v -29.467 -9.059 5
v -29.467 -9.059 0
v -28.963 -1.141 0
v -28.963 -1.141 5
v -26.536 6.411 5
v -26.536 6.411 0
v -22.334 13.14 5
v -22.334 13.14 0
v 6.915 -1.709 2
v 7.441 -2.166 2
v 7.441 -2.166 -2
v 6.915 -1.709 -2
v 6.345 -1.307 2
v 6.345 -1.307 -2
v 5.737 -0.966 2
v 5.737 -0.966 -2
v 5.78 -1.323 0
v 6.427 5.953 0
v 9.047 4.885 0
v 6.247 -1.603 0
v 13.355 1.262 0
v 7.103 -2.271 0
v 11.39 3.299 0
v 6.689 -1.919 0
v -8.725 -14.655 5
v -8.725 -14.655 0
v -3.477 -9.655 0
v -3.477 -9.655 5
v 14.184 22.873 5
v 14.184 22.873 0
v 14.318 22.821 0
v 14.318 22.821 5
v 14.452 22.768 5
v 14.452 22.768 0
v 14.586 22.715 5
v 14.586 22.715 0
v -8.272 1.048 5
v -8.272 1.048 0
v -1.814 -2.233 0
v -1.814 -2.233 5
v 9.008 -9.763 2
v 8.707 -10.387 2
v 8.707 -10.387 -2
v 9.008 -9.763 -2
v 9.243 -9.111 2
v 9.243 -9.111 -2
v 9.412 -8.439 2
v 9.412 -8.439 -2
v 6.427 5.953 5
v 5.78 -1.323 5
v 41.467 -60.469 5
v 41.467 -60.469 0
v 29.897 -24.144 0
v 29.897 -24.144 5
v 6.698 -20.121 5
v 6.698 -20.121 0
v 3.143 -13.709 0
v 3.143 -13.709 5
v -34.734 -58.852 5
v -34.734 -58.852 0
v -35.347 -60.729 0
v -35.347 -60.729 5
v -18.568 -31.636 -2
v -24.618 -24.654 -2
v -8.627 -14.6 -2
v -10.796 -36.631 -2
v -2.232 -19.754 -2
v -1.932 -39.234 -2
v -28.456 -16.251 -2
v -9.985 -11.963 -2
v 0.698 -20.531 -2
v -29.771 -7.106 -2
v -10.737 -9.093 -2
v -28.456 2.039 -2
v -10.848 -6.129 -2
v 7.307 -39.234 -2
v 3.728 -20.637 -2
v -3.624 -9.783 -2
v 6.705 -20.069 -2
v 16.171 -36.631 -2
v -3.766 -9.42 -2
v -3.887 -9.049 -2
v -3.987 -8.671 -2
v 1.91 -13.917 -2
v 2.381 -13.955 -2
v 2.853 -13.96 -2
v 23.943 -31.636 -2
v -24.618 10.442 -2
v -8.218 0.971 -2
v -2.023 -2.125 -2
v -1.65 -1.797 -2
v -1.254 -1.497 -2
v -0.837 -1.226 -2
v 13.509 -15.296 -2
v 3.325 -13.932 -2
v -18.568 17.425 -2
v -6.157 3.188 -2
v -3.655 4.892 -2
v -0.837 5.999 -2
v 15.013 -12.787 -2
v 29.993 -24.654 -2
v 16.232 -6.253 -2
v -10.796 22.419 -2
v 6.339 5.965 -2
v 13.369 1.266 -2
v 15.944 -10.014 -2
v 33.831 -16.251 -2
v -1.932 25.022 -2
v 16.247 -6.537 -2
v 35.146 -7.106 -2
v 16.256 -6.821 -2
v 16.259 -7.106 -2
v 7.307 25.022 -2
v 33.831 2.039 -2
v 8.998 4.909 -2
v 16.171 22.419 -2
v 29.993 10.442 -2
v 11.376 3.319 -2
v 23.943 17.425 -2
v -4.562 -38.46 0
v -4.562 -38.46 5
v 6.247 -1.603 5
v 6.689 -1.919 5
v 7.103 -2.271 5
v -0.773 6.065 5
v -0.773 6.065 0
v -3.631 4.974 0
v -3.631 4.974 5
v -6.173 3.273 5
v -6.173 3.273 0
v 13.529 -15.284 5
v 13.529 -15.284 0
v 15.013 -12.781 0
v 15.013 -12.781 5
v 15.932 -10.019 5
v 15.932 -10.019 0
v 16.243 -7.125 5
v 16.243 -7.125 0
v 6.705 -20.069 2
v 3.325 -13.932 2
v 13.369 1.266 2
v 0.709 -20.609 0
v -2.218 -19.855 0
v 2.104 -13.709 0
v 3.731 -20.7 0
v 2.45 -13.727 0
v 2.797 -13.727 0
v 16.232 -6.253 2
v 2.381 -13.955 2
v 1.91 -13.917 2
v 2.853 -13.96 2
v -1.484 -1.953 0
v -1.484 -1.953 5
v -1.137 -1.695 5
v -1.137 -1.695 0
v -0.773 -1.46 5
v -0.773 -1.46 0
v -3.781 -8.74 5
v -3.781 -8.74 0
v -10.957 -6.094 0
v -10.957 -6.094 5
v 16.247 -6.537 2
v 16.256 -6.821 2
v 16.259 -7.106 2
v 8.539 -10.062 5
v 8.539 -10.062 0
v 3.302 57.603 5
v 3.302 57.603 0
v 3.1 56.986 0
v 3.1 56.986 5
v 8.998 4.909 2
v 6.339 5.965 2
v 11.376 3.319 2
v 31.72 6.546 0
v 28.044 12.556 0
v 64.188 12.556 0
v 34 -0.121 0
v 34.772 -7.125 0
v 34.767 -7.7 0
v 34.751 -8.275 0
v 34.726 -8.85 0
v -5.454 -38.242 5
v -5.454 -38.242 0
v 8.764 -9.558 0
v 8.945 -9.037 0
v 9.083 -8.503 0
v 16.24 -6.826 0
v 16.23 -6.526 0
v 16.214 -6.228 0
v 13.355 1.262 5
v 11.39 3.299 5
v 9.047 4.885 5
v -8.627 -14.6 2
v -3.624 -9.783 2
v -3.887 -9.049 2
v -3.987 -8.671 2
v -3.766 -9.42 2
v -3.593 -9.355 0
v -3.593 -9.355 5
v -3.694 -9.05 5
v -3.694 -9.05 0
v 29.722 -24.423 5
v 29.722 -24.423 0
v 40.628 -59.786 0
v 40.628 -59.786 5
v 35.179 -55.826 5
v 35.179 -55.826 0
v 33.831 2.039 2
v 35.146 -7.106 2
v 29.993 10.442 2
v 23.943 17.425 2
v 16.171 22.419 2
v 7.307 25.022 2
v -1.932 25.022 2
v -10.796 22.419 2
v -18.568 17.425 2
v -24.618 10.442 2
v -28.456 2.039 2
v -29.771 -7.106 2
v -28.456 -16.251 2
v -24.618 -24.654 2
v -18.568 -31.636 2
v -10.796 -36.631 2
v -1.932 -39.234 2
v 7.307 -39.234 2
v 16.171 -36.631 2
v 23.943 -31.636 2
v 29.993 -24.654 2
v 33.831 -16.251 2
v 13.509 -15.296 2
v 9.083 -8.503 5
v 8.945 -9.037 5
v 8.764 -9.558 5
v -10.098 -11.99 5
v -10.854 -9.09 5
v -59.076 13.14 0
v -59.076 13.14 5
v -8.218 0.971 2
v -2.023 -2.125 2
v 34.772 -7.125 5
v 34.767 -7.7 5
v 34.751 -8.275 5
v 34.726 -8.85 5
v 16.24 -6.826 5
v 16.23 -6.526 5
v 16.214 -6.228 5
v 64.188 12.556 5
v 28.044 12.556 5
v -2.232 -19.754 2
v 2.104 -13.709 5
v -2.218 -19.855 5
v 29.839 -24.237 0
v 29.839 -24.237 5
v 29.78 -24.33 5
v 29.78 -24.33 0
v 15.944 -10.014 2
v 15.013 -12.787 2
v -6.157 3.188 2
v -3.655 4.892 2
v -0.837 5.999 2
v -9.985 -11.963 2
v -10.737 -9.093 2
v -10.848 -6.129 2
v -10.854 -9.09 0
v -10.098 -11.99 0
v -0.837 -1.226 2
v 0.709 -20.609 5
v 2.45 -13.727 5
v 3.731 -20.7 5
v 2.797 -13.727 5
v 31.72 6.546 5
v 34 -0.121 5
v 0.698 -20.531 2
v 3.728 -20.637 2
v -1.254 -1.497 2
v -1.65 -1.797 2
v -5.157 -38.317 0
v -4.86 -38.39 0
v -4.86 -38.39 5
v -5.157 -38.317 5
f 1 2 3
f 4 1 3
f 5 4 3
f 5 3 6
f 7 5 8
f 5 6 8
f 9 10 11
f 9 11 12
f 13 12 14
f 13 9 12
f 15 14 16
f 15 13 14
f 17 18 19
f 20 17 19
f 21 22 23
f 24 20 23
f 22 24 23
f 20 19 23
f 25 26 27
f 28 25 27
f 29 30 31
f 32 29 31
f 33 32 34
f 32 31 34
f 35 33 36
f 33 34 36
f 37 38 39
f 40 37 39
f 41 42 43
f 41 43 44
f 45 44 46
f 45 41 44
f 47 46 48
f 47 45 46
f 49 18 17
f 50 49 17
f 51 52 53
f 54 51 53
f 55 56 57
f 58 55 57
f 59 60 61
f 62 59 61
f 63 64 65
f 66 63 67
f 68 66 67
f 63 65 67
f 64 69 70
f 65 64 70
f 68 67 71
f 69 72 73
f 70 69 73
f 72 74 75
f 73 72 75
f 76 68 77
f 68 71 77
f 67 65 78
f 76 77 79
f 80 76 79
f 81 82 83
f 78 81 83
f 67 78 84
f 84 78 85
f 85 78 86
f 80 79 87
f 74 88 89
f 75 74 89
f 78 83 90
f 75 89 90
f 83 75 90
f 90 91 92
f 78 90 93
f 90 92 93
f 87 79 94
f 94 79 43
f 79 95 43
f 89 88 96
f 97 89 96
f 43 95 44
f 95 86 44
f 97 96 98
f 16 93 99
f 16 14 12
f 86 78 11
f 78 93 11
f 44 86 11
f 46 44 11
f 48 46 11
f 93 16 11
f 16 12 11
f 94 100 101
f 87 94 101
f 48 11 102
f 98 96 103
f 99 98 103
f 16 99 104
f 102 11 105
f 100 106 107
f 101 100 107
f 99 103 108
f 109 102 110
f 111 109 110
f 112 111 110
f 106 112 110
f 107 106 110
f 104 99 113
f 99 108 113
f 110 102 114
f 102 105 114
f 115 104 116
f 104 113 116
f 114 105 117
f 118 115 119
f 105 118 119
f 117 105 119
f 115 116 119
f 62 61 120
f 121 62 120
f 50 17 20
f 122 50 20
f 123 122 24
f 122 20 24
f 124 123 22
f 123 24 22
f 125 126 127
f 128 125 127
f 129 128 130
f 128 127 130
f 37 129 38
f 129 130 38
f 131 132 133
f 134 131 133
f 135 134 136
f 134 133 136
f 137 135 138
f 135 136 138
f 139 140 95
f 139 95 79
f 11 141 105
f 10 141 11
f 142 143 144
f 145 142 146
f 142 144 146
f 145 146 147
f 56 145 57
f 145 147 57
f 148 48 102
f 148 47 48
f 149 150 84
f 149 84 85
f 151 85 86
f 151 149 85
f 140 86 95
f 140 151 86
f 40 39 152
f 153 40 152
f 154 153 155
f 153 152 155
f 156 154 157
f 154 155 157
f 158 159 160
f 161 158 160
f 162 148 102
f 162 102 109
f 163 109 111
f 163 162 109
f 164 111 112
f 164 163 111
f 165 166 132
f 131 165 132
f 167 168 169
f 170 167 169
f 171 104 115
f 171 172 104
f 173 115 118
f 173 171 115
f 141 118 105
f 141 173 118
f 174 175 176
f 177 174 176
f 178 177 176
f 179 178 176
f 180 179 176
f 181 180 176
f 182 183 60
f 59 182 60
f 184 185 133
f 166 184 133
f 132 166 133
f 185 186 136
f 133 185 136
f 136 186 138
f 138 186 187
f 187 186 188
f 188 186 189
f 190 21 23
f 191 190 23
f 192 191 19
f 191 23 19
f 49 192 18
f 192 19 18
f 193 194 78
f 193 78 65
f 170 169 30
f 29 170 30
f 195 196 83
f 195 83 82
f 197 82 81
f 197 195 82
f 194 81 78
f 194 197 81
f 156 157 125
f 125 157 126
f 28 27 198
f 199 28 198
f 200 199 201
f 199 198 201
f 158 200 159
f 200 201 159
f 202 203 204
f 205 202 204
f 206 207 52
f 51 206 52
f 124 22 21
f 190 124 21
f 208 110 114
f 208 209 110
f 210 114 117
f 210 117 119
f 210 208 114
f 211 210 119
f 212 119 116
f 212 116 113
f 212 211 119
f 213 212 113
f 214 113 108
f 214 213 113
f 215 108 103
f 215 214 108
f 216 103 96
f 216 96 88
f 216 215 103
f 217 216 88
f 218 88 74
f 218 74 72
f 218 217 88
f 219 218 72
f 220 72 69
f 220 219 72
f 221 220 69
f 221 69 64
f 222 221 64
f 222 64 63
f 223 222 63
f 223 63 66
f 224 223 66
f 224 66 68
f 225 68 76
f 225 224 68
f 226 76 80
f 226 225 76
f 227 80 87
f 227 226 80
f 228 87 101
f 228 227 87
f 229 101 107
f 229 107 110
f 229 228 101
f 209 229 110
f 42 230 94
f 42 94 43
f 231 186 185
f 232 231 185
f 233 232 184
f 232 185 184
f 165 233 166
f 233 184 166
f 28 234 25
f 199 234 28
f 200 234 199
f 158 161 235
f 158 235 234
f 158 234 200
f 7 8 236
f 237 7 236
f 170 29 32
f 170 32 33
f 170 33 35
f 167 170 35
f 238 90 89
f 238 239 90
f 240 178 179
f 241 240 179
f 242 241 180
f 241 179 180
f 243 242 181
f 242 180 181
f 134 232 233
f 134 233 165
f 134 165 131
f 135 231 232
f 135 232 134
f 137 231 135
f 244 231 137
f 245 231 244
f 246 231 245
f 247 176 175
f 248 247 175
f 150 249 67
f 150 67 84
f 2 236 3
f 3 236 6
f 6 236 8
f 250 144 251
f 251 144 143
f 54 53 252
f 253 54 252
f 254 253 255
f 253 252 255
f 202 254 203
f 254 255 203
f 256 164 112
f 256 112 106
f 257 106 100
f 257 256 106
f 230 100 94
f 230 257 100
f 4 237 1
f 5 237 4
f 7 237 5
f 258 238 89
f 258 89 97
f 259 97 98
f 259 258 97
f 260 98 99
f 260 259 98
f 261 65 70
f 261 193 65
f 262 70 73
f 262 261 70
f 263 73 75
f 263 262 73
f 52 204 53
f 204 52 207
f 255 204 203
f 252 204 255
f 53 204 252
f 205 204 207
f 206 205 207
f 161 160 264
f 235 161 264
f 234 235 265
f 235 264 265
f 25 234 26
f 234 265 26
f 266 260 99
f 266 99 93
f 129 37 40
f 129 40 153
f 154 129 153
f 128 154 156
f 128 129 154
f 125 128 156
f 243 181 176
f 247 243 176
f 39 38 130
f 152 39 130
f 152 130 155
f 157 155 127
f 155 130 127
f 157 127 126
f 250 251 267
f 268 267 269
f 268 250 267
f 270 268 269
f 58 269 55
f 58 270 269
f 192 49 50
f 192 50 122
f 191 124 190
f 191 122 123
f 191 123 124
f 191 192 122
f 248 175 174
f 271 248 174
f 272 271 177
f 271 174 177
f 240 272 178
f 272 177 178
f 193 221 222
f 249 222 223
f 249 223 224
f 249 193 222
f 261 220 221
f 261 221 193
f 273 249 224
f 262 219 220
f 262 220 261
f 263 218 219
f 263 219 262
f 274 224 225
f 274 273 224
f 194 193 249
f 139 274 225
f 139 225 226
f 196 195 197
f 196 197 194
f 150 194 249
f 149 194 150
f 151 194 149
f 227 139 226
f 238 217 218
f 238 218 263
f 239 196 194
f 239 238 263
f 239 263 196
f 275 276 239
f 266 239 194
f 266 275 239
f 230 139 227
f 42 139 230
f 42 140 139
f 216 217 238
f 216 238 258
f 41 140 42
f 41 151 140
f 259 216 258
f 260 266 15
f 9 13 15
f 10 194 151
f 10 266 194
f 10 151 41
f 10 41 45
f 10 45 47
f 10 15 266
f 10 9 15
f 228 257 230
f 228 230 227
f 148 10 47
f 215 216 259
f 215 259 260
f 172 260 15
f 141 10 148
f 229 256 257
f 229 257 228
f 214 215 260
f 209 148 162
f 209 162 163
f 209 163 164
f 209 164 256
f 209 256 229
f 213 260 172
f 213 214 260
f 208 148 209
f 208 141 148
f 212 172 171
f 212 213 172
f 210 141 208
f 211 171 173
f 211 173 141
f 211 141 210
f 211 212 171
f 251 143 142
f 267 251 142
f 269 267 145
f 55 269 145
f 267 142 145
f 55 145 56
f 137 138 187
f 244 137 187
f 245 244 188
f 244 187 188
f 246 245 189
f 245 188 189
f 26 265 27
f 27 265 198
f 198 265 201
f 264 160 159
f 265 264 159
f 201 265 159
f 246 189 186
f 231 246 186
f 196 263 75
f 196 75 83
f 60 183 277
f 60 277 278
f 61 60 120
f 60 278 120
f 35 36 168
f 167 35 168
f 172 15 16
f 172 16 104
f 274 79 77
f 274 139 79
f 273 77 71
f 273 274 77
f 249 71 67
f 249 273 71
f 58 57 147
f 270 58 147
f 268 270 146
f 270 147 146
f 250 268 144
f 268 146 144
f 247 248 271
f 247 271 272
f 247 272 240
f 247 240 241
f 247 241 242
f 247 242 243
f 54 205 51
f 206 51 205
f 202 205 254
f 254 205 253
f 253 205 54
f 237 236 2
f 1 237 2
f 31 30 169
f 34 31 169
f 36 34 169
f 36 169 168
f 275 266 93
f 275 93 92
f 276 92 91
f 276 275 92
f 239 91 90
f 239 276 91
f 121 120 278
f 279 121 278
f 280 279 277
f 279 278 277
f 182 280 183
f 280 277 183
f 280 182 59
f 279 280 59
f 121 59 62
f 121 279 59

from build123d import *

# Parameters (mm, degrees)
F1_DEPTH = 5
F2_R     = 32.458501
F3_DEPTH = 2


with BuildPart() as f1:
    # F0 (on Top) → F1 (new body)
    with BuildSketch(Plane.XY):
        with BuildLine():
            Line((3.10027, 56.985963), (14.184289, 22.872859))
            ThreePointArc((14.184289, 22.872859), (14.385229, 22.794644), (14.585639, 22.715083))
            Line((14.585639, 22.715083), (3.302074, 57.602804))
            Line((3.302074, 57.602804), (3.10027, 56.985963))
        make_face()
        with BuildLine():
            Line((-22.333545, 13.13988), (-59.076229, 13.13988))
            Line((-59.076229, 13.13988), (-29.466608, -9.058542))
            ThreePointArc((-29.466608, -9.058542), (-27.983473, 2.710131), (-22.333545, 13.13988))
        make_face()
        with BuildLine():
            Line((64.188366, 12.55599), (28.04357, 12.55599))
            ThreePointArc((28.04357, 12.55599), (33.043313, 3.27472), (34.771854, -7.124874))
            ThreePointArc((34.771854, -7.124874), (34.760272, -7.987753), (34.725533, -8.85001))
            Line((34.725533, -8.85001), (64.188366, 12.55599))
        make_face()
        with BuildLine():
            ThreePointArc((-4.562304, -38.459828), (-5.008854, -38.354063), (-5.453848, -38.241935))
            Line((-5.453848, -38.241935), (-34.734426, -58.851985))
            Line((-34.734426, -58.851985), (-35.346847, -60.729187))
            Line((-35.346847, -60.729187), (-4.562304, -38.459828))
        make_face()
        with BuildLine():
            Line((40.628342, -59.785608), (35.178669, -55.826189))
            Line((35.178669, -55.826189), (41.467287, -60.468797))
            Line((41.467287, -60.468797), (29.897419, -24.143974))
            ThreePointArc((29.897419, -24.143974), (29.809847, -24.283517), (29.72156, -24.422608))
            Line((29.72156, -24.422608), (40.628342, -59.785608))
        make_face()
        with BuildLine():
            Line((7.103012, -2.271305), (13.35462, 1.262125))
            ThreePointArc((13.35462, 1.262125), (10.259769, 4.152801), (6.426639, 5.953144))
            Line((6.426639, 5.953144), (5.780248, -1.323318))
            ThreePointArc((5.780248, -1.323318), (6.470939, -1.756415), (7.103012, -2.271305))
        make_face()
        with BuildLine():
            Line((-0.772594, -1.460124), (-0.772594, 6.064693))
            ThreePointArc((-0.772594, 6.064693), (-4.949712, 4.195215), (-8.271792, 1.047668))
            Line((-8.271792, 1.047668), (-1.814396, -2.23326))
            ThreePointArc((-1.814396, -2.23326), (-1.312524, -1.821051), (-0.772594, -1.460124))
        make_face()
        with BuildLine():
            ThreePointArc((-10.957221, -6.094463), (-10.55571, -10.560883), (-8.725422, -14.654801))
            Line((-8.725422, -14.654801), (-3.477397, -9.655051))
            ThreePointArc((-3.477397, -9.655051), (-3.645752, -9.203146), (-3.780684, -8.740161))
            Line((-3.780684, -8.740161), (-10.957221, -6.094463))
        make_face()
        with BuildLine():
            ThreePointArc((-2.217927, -19.855101), (2.217602, -20.738599), (6.697889, -20.120942))
            Line((6.697889, -20.120942), (3.143205, -13.709167))
            ThreePointArc((3.143205, -13.709167), (2.62352, -13.729644), (2.103835, -13.709167))
            Line((2.103835, -13.709167), (-2.217927, -19.855101))
        make_face()
        with BuildLine():
            ThreePointArc((13.528529, -15.284472), (15.546794, -11.424554), (16.243295, -7.124874))
            ThreePointArc((16.243295, -7.124874), (16.235897, -6.676023), (16.21371, -6.227659))
            Line((16.21371, -6.227659), (9.082944, -8.502852))
            ThreePointArc((9.082944, -8.502852), (8.859995, -9.299583), (8.53919, -10.06219))
            Line((8.53919, -10.06219), (13.528529, -15.284472))
        make_face()
    extrude(amount=F1_DEPTH)


with BuildPart() as f3:
    # F2 (on Top) → F3 (new body, symmetric)
    with BuildSketch(Plane.XY):
        with Locations((2.687603, -7.105927)):
            Circle(F2_R)
        with BuildLine():
            ThreePointArc((6.338678, 5.964937), (10.228914, 4.177089), (13.3686, 1.266297))
            ThreePointArc((13.3686, 1.266297), (15.37035, -2.27625), (16.231985, -6.252961))
            ThreePointArc((16.231985, -6.252961), (16.252107, -6.679233), (16.258817, -7.105927))
            ThreePointArc((16.258817, -7.105927), (15.552974, -11.425657), (13.508868, -15.296047))
            ThreePointArc((13.508868, -15.296047), (10.481437, -18.216012), (6.705356, -20.068778))
            ThreePointArc((6.705356, -20.068778), (2.209859, -20.668729), (-2.232283, -19.753953))
            ThreePointArc((-2.232283, -19.753953), (-5.828615, -17.672471), (-8.626575, -14.600404))
            ThreePointArc((-8.626575, -14.600404), (-10.439636, -10.548807), (-10.848395, -6.128903))
            ThreePointArc((-10.848395, -6.128903), (-10.03855, -2.391815), (-8.21839, 0.971024))
            ThreePointArc((-8.21839, 0.971024), (-4.9534, 4.109816), (-0.83742, 5.999493))
            ThreePointArc((-0.83742, 5.999493), (2.752954, 6.465129), (6.338678, 5.964937))
        make_face(mode=Mode.SUBTRACT)
        with BuildLine():
            ThreePointArc((-3.986898, -8.671346), (-3.878955, -5.136204), (-2.023328, -2.125302))
            Line((-2.023328, -2.125302), (-8.21839, 0.971024))
            ThreePointArc((-8.21839, 0.971024), (-10.03855, -2.391815), (-10.848395, -6.128903))
            Line((-10.848395, -6.128903), (-3.986898, -8.671346))
        make_face()
        with BuildLine():
            ThreePointArc((-0.83742, -1.225986), (2.416553, -0.255669), (5.73702, -0.965849))
            Line((5.73702, -0.965849), (6.338678, 5.964937))
            ThreePointArc((6.338678, 5.964937), (2.752954, 6.465129), (-0.83742, 5.999493))
            Line((-0.83742, 5.999493), (-0.83742, -1.225986))
        make_face()
        with BuildLine():
            ThreePointArc((7.441161, -2.165969), (8.995855, -4.421628), (9.543222, -7.105927))
            ThreePointArc((9.543222, -7.105927), (9.510432, -7.775638), (9.412377, -8.438942))
            Line((9.412377, -8.438942), (16.231985, -6.252961))
            ThreePointArc((16.231985, -6.252961), (15.37035, -2.27625), (13.3686, 1.266297))
            Line((13.3686, 1.266297), (7.441161, -2.165969))
        make_face()
        with BuildLine():
            ThreePointArc((9.412377, -8.438942), (9.510432, -7.775638), (9.543222, -7.105927))
            ThreePointArc((9.543222, -7.105927), (8.995855, -4.421628), (7.441161, -2.165969))
            ThreePointArc((7.441161, -2.165969), (6.634966, -1.500766), (5.73702, -0.965849))
            ThreePointArc((5.73702, -0.965849), (2.416553, -0.255669), (-0.83742, -1.225986))
            ThreePointArc((-0.83742, -1.225986), (-1.454852, -1.643366), (-2.023328, -2.125302))
            ThreePointArc((-2.023328, -2.125302), (-3.878955, -5.136204), (-3.986898, -8.671346))
            ThreePointArc((-3.986898, -8.671346), (-3.828988, -9.23514), (-3.623547, -9.783404))
            ThreePointArc((-3.623547, -9.783404), (-1.415375, -12.598201), (1.910139, -13.917319))
            ThreePointArc((1.910139, -13.917319), (2.616997, -13.961182), (3.324609, -13.931887))
            ThreePointArc((3.324609, -13.931887), (6.458358, -12.831389), (8.707055, -10.387041))
            ThreePointArc((8.707055, -10.387041), (9.133733, -9.43979), (9.412377, -8.438942))
        make_face()
        with BuildLine():
            Line((13.508868, -15.296047), (8.707055, -10.387041))
            ThreePointArc((8.707055, -10.387041), (6.458358, -12.831389), (3.324609, -13.931887))
            Line((3.324609, -13.931887), (6.705356, -20.068778))
            ThreePointArc((6.705356, -20.068778), (10.481437, -18.216012), (13.508868, -15.296047))
        make_face()
        with BuildLine():
            Line((-2.232283, -19.753953), (1.910139, -13.917319))
            ThreePointArc((1.910139, -13.917319), (-1.415375, -12.598201), (-3.623547, -9.783404))
            Line((-3.623547, -9.783404), (-8.626575, -14.600404))
            ThreePointArc((-8.626575, -14.600404), (-5.828615, -17.672471), (-2.232283, -19.753953))
        make_face()
    extrude(amount=F3_DEPTH, both=True)


solid = Compound([f1.part, f3.part])
